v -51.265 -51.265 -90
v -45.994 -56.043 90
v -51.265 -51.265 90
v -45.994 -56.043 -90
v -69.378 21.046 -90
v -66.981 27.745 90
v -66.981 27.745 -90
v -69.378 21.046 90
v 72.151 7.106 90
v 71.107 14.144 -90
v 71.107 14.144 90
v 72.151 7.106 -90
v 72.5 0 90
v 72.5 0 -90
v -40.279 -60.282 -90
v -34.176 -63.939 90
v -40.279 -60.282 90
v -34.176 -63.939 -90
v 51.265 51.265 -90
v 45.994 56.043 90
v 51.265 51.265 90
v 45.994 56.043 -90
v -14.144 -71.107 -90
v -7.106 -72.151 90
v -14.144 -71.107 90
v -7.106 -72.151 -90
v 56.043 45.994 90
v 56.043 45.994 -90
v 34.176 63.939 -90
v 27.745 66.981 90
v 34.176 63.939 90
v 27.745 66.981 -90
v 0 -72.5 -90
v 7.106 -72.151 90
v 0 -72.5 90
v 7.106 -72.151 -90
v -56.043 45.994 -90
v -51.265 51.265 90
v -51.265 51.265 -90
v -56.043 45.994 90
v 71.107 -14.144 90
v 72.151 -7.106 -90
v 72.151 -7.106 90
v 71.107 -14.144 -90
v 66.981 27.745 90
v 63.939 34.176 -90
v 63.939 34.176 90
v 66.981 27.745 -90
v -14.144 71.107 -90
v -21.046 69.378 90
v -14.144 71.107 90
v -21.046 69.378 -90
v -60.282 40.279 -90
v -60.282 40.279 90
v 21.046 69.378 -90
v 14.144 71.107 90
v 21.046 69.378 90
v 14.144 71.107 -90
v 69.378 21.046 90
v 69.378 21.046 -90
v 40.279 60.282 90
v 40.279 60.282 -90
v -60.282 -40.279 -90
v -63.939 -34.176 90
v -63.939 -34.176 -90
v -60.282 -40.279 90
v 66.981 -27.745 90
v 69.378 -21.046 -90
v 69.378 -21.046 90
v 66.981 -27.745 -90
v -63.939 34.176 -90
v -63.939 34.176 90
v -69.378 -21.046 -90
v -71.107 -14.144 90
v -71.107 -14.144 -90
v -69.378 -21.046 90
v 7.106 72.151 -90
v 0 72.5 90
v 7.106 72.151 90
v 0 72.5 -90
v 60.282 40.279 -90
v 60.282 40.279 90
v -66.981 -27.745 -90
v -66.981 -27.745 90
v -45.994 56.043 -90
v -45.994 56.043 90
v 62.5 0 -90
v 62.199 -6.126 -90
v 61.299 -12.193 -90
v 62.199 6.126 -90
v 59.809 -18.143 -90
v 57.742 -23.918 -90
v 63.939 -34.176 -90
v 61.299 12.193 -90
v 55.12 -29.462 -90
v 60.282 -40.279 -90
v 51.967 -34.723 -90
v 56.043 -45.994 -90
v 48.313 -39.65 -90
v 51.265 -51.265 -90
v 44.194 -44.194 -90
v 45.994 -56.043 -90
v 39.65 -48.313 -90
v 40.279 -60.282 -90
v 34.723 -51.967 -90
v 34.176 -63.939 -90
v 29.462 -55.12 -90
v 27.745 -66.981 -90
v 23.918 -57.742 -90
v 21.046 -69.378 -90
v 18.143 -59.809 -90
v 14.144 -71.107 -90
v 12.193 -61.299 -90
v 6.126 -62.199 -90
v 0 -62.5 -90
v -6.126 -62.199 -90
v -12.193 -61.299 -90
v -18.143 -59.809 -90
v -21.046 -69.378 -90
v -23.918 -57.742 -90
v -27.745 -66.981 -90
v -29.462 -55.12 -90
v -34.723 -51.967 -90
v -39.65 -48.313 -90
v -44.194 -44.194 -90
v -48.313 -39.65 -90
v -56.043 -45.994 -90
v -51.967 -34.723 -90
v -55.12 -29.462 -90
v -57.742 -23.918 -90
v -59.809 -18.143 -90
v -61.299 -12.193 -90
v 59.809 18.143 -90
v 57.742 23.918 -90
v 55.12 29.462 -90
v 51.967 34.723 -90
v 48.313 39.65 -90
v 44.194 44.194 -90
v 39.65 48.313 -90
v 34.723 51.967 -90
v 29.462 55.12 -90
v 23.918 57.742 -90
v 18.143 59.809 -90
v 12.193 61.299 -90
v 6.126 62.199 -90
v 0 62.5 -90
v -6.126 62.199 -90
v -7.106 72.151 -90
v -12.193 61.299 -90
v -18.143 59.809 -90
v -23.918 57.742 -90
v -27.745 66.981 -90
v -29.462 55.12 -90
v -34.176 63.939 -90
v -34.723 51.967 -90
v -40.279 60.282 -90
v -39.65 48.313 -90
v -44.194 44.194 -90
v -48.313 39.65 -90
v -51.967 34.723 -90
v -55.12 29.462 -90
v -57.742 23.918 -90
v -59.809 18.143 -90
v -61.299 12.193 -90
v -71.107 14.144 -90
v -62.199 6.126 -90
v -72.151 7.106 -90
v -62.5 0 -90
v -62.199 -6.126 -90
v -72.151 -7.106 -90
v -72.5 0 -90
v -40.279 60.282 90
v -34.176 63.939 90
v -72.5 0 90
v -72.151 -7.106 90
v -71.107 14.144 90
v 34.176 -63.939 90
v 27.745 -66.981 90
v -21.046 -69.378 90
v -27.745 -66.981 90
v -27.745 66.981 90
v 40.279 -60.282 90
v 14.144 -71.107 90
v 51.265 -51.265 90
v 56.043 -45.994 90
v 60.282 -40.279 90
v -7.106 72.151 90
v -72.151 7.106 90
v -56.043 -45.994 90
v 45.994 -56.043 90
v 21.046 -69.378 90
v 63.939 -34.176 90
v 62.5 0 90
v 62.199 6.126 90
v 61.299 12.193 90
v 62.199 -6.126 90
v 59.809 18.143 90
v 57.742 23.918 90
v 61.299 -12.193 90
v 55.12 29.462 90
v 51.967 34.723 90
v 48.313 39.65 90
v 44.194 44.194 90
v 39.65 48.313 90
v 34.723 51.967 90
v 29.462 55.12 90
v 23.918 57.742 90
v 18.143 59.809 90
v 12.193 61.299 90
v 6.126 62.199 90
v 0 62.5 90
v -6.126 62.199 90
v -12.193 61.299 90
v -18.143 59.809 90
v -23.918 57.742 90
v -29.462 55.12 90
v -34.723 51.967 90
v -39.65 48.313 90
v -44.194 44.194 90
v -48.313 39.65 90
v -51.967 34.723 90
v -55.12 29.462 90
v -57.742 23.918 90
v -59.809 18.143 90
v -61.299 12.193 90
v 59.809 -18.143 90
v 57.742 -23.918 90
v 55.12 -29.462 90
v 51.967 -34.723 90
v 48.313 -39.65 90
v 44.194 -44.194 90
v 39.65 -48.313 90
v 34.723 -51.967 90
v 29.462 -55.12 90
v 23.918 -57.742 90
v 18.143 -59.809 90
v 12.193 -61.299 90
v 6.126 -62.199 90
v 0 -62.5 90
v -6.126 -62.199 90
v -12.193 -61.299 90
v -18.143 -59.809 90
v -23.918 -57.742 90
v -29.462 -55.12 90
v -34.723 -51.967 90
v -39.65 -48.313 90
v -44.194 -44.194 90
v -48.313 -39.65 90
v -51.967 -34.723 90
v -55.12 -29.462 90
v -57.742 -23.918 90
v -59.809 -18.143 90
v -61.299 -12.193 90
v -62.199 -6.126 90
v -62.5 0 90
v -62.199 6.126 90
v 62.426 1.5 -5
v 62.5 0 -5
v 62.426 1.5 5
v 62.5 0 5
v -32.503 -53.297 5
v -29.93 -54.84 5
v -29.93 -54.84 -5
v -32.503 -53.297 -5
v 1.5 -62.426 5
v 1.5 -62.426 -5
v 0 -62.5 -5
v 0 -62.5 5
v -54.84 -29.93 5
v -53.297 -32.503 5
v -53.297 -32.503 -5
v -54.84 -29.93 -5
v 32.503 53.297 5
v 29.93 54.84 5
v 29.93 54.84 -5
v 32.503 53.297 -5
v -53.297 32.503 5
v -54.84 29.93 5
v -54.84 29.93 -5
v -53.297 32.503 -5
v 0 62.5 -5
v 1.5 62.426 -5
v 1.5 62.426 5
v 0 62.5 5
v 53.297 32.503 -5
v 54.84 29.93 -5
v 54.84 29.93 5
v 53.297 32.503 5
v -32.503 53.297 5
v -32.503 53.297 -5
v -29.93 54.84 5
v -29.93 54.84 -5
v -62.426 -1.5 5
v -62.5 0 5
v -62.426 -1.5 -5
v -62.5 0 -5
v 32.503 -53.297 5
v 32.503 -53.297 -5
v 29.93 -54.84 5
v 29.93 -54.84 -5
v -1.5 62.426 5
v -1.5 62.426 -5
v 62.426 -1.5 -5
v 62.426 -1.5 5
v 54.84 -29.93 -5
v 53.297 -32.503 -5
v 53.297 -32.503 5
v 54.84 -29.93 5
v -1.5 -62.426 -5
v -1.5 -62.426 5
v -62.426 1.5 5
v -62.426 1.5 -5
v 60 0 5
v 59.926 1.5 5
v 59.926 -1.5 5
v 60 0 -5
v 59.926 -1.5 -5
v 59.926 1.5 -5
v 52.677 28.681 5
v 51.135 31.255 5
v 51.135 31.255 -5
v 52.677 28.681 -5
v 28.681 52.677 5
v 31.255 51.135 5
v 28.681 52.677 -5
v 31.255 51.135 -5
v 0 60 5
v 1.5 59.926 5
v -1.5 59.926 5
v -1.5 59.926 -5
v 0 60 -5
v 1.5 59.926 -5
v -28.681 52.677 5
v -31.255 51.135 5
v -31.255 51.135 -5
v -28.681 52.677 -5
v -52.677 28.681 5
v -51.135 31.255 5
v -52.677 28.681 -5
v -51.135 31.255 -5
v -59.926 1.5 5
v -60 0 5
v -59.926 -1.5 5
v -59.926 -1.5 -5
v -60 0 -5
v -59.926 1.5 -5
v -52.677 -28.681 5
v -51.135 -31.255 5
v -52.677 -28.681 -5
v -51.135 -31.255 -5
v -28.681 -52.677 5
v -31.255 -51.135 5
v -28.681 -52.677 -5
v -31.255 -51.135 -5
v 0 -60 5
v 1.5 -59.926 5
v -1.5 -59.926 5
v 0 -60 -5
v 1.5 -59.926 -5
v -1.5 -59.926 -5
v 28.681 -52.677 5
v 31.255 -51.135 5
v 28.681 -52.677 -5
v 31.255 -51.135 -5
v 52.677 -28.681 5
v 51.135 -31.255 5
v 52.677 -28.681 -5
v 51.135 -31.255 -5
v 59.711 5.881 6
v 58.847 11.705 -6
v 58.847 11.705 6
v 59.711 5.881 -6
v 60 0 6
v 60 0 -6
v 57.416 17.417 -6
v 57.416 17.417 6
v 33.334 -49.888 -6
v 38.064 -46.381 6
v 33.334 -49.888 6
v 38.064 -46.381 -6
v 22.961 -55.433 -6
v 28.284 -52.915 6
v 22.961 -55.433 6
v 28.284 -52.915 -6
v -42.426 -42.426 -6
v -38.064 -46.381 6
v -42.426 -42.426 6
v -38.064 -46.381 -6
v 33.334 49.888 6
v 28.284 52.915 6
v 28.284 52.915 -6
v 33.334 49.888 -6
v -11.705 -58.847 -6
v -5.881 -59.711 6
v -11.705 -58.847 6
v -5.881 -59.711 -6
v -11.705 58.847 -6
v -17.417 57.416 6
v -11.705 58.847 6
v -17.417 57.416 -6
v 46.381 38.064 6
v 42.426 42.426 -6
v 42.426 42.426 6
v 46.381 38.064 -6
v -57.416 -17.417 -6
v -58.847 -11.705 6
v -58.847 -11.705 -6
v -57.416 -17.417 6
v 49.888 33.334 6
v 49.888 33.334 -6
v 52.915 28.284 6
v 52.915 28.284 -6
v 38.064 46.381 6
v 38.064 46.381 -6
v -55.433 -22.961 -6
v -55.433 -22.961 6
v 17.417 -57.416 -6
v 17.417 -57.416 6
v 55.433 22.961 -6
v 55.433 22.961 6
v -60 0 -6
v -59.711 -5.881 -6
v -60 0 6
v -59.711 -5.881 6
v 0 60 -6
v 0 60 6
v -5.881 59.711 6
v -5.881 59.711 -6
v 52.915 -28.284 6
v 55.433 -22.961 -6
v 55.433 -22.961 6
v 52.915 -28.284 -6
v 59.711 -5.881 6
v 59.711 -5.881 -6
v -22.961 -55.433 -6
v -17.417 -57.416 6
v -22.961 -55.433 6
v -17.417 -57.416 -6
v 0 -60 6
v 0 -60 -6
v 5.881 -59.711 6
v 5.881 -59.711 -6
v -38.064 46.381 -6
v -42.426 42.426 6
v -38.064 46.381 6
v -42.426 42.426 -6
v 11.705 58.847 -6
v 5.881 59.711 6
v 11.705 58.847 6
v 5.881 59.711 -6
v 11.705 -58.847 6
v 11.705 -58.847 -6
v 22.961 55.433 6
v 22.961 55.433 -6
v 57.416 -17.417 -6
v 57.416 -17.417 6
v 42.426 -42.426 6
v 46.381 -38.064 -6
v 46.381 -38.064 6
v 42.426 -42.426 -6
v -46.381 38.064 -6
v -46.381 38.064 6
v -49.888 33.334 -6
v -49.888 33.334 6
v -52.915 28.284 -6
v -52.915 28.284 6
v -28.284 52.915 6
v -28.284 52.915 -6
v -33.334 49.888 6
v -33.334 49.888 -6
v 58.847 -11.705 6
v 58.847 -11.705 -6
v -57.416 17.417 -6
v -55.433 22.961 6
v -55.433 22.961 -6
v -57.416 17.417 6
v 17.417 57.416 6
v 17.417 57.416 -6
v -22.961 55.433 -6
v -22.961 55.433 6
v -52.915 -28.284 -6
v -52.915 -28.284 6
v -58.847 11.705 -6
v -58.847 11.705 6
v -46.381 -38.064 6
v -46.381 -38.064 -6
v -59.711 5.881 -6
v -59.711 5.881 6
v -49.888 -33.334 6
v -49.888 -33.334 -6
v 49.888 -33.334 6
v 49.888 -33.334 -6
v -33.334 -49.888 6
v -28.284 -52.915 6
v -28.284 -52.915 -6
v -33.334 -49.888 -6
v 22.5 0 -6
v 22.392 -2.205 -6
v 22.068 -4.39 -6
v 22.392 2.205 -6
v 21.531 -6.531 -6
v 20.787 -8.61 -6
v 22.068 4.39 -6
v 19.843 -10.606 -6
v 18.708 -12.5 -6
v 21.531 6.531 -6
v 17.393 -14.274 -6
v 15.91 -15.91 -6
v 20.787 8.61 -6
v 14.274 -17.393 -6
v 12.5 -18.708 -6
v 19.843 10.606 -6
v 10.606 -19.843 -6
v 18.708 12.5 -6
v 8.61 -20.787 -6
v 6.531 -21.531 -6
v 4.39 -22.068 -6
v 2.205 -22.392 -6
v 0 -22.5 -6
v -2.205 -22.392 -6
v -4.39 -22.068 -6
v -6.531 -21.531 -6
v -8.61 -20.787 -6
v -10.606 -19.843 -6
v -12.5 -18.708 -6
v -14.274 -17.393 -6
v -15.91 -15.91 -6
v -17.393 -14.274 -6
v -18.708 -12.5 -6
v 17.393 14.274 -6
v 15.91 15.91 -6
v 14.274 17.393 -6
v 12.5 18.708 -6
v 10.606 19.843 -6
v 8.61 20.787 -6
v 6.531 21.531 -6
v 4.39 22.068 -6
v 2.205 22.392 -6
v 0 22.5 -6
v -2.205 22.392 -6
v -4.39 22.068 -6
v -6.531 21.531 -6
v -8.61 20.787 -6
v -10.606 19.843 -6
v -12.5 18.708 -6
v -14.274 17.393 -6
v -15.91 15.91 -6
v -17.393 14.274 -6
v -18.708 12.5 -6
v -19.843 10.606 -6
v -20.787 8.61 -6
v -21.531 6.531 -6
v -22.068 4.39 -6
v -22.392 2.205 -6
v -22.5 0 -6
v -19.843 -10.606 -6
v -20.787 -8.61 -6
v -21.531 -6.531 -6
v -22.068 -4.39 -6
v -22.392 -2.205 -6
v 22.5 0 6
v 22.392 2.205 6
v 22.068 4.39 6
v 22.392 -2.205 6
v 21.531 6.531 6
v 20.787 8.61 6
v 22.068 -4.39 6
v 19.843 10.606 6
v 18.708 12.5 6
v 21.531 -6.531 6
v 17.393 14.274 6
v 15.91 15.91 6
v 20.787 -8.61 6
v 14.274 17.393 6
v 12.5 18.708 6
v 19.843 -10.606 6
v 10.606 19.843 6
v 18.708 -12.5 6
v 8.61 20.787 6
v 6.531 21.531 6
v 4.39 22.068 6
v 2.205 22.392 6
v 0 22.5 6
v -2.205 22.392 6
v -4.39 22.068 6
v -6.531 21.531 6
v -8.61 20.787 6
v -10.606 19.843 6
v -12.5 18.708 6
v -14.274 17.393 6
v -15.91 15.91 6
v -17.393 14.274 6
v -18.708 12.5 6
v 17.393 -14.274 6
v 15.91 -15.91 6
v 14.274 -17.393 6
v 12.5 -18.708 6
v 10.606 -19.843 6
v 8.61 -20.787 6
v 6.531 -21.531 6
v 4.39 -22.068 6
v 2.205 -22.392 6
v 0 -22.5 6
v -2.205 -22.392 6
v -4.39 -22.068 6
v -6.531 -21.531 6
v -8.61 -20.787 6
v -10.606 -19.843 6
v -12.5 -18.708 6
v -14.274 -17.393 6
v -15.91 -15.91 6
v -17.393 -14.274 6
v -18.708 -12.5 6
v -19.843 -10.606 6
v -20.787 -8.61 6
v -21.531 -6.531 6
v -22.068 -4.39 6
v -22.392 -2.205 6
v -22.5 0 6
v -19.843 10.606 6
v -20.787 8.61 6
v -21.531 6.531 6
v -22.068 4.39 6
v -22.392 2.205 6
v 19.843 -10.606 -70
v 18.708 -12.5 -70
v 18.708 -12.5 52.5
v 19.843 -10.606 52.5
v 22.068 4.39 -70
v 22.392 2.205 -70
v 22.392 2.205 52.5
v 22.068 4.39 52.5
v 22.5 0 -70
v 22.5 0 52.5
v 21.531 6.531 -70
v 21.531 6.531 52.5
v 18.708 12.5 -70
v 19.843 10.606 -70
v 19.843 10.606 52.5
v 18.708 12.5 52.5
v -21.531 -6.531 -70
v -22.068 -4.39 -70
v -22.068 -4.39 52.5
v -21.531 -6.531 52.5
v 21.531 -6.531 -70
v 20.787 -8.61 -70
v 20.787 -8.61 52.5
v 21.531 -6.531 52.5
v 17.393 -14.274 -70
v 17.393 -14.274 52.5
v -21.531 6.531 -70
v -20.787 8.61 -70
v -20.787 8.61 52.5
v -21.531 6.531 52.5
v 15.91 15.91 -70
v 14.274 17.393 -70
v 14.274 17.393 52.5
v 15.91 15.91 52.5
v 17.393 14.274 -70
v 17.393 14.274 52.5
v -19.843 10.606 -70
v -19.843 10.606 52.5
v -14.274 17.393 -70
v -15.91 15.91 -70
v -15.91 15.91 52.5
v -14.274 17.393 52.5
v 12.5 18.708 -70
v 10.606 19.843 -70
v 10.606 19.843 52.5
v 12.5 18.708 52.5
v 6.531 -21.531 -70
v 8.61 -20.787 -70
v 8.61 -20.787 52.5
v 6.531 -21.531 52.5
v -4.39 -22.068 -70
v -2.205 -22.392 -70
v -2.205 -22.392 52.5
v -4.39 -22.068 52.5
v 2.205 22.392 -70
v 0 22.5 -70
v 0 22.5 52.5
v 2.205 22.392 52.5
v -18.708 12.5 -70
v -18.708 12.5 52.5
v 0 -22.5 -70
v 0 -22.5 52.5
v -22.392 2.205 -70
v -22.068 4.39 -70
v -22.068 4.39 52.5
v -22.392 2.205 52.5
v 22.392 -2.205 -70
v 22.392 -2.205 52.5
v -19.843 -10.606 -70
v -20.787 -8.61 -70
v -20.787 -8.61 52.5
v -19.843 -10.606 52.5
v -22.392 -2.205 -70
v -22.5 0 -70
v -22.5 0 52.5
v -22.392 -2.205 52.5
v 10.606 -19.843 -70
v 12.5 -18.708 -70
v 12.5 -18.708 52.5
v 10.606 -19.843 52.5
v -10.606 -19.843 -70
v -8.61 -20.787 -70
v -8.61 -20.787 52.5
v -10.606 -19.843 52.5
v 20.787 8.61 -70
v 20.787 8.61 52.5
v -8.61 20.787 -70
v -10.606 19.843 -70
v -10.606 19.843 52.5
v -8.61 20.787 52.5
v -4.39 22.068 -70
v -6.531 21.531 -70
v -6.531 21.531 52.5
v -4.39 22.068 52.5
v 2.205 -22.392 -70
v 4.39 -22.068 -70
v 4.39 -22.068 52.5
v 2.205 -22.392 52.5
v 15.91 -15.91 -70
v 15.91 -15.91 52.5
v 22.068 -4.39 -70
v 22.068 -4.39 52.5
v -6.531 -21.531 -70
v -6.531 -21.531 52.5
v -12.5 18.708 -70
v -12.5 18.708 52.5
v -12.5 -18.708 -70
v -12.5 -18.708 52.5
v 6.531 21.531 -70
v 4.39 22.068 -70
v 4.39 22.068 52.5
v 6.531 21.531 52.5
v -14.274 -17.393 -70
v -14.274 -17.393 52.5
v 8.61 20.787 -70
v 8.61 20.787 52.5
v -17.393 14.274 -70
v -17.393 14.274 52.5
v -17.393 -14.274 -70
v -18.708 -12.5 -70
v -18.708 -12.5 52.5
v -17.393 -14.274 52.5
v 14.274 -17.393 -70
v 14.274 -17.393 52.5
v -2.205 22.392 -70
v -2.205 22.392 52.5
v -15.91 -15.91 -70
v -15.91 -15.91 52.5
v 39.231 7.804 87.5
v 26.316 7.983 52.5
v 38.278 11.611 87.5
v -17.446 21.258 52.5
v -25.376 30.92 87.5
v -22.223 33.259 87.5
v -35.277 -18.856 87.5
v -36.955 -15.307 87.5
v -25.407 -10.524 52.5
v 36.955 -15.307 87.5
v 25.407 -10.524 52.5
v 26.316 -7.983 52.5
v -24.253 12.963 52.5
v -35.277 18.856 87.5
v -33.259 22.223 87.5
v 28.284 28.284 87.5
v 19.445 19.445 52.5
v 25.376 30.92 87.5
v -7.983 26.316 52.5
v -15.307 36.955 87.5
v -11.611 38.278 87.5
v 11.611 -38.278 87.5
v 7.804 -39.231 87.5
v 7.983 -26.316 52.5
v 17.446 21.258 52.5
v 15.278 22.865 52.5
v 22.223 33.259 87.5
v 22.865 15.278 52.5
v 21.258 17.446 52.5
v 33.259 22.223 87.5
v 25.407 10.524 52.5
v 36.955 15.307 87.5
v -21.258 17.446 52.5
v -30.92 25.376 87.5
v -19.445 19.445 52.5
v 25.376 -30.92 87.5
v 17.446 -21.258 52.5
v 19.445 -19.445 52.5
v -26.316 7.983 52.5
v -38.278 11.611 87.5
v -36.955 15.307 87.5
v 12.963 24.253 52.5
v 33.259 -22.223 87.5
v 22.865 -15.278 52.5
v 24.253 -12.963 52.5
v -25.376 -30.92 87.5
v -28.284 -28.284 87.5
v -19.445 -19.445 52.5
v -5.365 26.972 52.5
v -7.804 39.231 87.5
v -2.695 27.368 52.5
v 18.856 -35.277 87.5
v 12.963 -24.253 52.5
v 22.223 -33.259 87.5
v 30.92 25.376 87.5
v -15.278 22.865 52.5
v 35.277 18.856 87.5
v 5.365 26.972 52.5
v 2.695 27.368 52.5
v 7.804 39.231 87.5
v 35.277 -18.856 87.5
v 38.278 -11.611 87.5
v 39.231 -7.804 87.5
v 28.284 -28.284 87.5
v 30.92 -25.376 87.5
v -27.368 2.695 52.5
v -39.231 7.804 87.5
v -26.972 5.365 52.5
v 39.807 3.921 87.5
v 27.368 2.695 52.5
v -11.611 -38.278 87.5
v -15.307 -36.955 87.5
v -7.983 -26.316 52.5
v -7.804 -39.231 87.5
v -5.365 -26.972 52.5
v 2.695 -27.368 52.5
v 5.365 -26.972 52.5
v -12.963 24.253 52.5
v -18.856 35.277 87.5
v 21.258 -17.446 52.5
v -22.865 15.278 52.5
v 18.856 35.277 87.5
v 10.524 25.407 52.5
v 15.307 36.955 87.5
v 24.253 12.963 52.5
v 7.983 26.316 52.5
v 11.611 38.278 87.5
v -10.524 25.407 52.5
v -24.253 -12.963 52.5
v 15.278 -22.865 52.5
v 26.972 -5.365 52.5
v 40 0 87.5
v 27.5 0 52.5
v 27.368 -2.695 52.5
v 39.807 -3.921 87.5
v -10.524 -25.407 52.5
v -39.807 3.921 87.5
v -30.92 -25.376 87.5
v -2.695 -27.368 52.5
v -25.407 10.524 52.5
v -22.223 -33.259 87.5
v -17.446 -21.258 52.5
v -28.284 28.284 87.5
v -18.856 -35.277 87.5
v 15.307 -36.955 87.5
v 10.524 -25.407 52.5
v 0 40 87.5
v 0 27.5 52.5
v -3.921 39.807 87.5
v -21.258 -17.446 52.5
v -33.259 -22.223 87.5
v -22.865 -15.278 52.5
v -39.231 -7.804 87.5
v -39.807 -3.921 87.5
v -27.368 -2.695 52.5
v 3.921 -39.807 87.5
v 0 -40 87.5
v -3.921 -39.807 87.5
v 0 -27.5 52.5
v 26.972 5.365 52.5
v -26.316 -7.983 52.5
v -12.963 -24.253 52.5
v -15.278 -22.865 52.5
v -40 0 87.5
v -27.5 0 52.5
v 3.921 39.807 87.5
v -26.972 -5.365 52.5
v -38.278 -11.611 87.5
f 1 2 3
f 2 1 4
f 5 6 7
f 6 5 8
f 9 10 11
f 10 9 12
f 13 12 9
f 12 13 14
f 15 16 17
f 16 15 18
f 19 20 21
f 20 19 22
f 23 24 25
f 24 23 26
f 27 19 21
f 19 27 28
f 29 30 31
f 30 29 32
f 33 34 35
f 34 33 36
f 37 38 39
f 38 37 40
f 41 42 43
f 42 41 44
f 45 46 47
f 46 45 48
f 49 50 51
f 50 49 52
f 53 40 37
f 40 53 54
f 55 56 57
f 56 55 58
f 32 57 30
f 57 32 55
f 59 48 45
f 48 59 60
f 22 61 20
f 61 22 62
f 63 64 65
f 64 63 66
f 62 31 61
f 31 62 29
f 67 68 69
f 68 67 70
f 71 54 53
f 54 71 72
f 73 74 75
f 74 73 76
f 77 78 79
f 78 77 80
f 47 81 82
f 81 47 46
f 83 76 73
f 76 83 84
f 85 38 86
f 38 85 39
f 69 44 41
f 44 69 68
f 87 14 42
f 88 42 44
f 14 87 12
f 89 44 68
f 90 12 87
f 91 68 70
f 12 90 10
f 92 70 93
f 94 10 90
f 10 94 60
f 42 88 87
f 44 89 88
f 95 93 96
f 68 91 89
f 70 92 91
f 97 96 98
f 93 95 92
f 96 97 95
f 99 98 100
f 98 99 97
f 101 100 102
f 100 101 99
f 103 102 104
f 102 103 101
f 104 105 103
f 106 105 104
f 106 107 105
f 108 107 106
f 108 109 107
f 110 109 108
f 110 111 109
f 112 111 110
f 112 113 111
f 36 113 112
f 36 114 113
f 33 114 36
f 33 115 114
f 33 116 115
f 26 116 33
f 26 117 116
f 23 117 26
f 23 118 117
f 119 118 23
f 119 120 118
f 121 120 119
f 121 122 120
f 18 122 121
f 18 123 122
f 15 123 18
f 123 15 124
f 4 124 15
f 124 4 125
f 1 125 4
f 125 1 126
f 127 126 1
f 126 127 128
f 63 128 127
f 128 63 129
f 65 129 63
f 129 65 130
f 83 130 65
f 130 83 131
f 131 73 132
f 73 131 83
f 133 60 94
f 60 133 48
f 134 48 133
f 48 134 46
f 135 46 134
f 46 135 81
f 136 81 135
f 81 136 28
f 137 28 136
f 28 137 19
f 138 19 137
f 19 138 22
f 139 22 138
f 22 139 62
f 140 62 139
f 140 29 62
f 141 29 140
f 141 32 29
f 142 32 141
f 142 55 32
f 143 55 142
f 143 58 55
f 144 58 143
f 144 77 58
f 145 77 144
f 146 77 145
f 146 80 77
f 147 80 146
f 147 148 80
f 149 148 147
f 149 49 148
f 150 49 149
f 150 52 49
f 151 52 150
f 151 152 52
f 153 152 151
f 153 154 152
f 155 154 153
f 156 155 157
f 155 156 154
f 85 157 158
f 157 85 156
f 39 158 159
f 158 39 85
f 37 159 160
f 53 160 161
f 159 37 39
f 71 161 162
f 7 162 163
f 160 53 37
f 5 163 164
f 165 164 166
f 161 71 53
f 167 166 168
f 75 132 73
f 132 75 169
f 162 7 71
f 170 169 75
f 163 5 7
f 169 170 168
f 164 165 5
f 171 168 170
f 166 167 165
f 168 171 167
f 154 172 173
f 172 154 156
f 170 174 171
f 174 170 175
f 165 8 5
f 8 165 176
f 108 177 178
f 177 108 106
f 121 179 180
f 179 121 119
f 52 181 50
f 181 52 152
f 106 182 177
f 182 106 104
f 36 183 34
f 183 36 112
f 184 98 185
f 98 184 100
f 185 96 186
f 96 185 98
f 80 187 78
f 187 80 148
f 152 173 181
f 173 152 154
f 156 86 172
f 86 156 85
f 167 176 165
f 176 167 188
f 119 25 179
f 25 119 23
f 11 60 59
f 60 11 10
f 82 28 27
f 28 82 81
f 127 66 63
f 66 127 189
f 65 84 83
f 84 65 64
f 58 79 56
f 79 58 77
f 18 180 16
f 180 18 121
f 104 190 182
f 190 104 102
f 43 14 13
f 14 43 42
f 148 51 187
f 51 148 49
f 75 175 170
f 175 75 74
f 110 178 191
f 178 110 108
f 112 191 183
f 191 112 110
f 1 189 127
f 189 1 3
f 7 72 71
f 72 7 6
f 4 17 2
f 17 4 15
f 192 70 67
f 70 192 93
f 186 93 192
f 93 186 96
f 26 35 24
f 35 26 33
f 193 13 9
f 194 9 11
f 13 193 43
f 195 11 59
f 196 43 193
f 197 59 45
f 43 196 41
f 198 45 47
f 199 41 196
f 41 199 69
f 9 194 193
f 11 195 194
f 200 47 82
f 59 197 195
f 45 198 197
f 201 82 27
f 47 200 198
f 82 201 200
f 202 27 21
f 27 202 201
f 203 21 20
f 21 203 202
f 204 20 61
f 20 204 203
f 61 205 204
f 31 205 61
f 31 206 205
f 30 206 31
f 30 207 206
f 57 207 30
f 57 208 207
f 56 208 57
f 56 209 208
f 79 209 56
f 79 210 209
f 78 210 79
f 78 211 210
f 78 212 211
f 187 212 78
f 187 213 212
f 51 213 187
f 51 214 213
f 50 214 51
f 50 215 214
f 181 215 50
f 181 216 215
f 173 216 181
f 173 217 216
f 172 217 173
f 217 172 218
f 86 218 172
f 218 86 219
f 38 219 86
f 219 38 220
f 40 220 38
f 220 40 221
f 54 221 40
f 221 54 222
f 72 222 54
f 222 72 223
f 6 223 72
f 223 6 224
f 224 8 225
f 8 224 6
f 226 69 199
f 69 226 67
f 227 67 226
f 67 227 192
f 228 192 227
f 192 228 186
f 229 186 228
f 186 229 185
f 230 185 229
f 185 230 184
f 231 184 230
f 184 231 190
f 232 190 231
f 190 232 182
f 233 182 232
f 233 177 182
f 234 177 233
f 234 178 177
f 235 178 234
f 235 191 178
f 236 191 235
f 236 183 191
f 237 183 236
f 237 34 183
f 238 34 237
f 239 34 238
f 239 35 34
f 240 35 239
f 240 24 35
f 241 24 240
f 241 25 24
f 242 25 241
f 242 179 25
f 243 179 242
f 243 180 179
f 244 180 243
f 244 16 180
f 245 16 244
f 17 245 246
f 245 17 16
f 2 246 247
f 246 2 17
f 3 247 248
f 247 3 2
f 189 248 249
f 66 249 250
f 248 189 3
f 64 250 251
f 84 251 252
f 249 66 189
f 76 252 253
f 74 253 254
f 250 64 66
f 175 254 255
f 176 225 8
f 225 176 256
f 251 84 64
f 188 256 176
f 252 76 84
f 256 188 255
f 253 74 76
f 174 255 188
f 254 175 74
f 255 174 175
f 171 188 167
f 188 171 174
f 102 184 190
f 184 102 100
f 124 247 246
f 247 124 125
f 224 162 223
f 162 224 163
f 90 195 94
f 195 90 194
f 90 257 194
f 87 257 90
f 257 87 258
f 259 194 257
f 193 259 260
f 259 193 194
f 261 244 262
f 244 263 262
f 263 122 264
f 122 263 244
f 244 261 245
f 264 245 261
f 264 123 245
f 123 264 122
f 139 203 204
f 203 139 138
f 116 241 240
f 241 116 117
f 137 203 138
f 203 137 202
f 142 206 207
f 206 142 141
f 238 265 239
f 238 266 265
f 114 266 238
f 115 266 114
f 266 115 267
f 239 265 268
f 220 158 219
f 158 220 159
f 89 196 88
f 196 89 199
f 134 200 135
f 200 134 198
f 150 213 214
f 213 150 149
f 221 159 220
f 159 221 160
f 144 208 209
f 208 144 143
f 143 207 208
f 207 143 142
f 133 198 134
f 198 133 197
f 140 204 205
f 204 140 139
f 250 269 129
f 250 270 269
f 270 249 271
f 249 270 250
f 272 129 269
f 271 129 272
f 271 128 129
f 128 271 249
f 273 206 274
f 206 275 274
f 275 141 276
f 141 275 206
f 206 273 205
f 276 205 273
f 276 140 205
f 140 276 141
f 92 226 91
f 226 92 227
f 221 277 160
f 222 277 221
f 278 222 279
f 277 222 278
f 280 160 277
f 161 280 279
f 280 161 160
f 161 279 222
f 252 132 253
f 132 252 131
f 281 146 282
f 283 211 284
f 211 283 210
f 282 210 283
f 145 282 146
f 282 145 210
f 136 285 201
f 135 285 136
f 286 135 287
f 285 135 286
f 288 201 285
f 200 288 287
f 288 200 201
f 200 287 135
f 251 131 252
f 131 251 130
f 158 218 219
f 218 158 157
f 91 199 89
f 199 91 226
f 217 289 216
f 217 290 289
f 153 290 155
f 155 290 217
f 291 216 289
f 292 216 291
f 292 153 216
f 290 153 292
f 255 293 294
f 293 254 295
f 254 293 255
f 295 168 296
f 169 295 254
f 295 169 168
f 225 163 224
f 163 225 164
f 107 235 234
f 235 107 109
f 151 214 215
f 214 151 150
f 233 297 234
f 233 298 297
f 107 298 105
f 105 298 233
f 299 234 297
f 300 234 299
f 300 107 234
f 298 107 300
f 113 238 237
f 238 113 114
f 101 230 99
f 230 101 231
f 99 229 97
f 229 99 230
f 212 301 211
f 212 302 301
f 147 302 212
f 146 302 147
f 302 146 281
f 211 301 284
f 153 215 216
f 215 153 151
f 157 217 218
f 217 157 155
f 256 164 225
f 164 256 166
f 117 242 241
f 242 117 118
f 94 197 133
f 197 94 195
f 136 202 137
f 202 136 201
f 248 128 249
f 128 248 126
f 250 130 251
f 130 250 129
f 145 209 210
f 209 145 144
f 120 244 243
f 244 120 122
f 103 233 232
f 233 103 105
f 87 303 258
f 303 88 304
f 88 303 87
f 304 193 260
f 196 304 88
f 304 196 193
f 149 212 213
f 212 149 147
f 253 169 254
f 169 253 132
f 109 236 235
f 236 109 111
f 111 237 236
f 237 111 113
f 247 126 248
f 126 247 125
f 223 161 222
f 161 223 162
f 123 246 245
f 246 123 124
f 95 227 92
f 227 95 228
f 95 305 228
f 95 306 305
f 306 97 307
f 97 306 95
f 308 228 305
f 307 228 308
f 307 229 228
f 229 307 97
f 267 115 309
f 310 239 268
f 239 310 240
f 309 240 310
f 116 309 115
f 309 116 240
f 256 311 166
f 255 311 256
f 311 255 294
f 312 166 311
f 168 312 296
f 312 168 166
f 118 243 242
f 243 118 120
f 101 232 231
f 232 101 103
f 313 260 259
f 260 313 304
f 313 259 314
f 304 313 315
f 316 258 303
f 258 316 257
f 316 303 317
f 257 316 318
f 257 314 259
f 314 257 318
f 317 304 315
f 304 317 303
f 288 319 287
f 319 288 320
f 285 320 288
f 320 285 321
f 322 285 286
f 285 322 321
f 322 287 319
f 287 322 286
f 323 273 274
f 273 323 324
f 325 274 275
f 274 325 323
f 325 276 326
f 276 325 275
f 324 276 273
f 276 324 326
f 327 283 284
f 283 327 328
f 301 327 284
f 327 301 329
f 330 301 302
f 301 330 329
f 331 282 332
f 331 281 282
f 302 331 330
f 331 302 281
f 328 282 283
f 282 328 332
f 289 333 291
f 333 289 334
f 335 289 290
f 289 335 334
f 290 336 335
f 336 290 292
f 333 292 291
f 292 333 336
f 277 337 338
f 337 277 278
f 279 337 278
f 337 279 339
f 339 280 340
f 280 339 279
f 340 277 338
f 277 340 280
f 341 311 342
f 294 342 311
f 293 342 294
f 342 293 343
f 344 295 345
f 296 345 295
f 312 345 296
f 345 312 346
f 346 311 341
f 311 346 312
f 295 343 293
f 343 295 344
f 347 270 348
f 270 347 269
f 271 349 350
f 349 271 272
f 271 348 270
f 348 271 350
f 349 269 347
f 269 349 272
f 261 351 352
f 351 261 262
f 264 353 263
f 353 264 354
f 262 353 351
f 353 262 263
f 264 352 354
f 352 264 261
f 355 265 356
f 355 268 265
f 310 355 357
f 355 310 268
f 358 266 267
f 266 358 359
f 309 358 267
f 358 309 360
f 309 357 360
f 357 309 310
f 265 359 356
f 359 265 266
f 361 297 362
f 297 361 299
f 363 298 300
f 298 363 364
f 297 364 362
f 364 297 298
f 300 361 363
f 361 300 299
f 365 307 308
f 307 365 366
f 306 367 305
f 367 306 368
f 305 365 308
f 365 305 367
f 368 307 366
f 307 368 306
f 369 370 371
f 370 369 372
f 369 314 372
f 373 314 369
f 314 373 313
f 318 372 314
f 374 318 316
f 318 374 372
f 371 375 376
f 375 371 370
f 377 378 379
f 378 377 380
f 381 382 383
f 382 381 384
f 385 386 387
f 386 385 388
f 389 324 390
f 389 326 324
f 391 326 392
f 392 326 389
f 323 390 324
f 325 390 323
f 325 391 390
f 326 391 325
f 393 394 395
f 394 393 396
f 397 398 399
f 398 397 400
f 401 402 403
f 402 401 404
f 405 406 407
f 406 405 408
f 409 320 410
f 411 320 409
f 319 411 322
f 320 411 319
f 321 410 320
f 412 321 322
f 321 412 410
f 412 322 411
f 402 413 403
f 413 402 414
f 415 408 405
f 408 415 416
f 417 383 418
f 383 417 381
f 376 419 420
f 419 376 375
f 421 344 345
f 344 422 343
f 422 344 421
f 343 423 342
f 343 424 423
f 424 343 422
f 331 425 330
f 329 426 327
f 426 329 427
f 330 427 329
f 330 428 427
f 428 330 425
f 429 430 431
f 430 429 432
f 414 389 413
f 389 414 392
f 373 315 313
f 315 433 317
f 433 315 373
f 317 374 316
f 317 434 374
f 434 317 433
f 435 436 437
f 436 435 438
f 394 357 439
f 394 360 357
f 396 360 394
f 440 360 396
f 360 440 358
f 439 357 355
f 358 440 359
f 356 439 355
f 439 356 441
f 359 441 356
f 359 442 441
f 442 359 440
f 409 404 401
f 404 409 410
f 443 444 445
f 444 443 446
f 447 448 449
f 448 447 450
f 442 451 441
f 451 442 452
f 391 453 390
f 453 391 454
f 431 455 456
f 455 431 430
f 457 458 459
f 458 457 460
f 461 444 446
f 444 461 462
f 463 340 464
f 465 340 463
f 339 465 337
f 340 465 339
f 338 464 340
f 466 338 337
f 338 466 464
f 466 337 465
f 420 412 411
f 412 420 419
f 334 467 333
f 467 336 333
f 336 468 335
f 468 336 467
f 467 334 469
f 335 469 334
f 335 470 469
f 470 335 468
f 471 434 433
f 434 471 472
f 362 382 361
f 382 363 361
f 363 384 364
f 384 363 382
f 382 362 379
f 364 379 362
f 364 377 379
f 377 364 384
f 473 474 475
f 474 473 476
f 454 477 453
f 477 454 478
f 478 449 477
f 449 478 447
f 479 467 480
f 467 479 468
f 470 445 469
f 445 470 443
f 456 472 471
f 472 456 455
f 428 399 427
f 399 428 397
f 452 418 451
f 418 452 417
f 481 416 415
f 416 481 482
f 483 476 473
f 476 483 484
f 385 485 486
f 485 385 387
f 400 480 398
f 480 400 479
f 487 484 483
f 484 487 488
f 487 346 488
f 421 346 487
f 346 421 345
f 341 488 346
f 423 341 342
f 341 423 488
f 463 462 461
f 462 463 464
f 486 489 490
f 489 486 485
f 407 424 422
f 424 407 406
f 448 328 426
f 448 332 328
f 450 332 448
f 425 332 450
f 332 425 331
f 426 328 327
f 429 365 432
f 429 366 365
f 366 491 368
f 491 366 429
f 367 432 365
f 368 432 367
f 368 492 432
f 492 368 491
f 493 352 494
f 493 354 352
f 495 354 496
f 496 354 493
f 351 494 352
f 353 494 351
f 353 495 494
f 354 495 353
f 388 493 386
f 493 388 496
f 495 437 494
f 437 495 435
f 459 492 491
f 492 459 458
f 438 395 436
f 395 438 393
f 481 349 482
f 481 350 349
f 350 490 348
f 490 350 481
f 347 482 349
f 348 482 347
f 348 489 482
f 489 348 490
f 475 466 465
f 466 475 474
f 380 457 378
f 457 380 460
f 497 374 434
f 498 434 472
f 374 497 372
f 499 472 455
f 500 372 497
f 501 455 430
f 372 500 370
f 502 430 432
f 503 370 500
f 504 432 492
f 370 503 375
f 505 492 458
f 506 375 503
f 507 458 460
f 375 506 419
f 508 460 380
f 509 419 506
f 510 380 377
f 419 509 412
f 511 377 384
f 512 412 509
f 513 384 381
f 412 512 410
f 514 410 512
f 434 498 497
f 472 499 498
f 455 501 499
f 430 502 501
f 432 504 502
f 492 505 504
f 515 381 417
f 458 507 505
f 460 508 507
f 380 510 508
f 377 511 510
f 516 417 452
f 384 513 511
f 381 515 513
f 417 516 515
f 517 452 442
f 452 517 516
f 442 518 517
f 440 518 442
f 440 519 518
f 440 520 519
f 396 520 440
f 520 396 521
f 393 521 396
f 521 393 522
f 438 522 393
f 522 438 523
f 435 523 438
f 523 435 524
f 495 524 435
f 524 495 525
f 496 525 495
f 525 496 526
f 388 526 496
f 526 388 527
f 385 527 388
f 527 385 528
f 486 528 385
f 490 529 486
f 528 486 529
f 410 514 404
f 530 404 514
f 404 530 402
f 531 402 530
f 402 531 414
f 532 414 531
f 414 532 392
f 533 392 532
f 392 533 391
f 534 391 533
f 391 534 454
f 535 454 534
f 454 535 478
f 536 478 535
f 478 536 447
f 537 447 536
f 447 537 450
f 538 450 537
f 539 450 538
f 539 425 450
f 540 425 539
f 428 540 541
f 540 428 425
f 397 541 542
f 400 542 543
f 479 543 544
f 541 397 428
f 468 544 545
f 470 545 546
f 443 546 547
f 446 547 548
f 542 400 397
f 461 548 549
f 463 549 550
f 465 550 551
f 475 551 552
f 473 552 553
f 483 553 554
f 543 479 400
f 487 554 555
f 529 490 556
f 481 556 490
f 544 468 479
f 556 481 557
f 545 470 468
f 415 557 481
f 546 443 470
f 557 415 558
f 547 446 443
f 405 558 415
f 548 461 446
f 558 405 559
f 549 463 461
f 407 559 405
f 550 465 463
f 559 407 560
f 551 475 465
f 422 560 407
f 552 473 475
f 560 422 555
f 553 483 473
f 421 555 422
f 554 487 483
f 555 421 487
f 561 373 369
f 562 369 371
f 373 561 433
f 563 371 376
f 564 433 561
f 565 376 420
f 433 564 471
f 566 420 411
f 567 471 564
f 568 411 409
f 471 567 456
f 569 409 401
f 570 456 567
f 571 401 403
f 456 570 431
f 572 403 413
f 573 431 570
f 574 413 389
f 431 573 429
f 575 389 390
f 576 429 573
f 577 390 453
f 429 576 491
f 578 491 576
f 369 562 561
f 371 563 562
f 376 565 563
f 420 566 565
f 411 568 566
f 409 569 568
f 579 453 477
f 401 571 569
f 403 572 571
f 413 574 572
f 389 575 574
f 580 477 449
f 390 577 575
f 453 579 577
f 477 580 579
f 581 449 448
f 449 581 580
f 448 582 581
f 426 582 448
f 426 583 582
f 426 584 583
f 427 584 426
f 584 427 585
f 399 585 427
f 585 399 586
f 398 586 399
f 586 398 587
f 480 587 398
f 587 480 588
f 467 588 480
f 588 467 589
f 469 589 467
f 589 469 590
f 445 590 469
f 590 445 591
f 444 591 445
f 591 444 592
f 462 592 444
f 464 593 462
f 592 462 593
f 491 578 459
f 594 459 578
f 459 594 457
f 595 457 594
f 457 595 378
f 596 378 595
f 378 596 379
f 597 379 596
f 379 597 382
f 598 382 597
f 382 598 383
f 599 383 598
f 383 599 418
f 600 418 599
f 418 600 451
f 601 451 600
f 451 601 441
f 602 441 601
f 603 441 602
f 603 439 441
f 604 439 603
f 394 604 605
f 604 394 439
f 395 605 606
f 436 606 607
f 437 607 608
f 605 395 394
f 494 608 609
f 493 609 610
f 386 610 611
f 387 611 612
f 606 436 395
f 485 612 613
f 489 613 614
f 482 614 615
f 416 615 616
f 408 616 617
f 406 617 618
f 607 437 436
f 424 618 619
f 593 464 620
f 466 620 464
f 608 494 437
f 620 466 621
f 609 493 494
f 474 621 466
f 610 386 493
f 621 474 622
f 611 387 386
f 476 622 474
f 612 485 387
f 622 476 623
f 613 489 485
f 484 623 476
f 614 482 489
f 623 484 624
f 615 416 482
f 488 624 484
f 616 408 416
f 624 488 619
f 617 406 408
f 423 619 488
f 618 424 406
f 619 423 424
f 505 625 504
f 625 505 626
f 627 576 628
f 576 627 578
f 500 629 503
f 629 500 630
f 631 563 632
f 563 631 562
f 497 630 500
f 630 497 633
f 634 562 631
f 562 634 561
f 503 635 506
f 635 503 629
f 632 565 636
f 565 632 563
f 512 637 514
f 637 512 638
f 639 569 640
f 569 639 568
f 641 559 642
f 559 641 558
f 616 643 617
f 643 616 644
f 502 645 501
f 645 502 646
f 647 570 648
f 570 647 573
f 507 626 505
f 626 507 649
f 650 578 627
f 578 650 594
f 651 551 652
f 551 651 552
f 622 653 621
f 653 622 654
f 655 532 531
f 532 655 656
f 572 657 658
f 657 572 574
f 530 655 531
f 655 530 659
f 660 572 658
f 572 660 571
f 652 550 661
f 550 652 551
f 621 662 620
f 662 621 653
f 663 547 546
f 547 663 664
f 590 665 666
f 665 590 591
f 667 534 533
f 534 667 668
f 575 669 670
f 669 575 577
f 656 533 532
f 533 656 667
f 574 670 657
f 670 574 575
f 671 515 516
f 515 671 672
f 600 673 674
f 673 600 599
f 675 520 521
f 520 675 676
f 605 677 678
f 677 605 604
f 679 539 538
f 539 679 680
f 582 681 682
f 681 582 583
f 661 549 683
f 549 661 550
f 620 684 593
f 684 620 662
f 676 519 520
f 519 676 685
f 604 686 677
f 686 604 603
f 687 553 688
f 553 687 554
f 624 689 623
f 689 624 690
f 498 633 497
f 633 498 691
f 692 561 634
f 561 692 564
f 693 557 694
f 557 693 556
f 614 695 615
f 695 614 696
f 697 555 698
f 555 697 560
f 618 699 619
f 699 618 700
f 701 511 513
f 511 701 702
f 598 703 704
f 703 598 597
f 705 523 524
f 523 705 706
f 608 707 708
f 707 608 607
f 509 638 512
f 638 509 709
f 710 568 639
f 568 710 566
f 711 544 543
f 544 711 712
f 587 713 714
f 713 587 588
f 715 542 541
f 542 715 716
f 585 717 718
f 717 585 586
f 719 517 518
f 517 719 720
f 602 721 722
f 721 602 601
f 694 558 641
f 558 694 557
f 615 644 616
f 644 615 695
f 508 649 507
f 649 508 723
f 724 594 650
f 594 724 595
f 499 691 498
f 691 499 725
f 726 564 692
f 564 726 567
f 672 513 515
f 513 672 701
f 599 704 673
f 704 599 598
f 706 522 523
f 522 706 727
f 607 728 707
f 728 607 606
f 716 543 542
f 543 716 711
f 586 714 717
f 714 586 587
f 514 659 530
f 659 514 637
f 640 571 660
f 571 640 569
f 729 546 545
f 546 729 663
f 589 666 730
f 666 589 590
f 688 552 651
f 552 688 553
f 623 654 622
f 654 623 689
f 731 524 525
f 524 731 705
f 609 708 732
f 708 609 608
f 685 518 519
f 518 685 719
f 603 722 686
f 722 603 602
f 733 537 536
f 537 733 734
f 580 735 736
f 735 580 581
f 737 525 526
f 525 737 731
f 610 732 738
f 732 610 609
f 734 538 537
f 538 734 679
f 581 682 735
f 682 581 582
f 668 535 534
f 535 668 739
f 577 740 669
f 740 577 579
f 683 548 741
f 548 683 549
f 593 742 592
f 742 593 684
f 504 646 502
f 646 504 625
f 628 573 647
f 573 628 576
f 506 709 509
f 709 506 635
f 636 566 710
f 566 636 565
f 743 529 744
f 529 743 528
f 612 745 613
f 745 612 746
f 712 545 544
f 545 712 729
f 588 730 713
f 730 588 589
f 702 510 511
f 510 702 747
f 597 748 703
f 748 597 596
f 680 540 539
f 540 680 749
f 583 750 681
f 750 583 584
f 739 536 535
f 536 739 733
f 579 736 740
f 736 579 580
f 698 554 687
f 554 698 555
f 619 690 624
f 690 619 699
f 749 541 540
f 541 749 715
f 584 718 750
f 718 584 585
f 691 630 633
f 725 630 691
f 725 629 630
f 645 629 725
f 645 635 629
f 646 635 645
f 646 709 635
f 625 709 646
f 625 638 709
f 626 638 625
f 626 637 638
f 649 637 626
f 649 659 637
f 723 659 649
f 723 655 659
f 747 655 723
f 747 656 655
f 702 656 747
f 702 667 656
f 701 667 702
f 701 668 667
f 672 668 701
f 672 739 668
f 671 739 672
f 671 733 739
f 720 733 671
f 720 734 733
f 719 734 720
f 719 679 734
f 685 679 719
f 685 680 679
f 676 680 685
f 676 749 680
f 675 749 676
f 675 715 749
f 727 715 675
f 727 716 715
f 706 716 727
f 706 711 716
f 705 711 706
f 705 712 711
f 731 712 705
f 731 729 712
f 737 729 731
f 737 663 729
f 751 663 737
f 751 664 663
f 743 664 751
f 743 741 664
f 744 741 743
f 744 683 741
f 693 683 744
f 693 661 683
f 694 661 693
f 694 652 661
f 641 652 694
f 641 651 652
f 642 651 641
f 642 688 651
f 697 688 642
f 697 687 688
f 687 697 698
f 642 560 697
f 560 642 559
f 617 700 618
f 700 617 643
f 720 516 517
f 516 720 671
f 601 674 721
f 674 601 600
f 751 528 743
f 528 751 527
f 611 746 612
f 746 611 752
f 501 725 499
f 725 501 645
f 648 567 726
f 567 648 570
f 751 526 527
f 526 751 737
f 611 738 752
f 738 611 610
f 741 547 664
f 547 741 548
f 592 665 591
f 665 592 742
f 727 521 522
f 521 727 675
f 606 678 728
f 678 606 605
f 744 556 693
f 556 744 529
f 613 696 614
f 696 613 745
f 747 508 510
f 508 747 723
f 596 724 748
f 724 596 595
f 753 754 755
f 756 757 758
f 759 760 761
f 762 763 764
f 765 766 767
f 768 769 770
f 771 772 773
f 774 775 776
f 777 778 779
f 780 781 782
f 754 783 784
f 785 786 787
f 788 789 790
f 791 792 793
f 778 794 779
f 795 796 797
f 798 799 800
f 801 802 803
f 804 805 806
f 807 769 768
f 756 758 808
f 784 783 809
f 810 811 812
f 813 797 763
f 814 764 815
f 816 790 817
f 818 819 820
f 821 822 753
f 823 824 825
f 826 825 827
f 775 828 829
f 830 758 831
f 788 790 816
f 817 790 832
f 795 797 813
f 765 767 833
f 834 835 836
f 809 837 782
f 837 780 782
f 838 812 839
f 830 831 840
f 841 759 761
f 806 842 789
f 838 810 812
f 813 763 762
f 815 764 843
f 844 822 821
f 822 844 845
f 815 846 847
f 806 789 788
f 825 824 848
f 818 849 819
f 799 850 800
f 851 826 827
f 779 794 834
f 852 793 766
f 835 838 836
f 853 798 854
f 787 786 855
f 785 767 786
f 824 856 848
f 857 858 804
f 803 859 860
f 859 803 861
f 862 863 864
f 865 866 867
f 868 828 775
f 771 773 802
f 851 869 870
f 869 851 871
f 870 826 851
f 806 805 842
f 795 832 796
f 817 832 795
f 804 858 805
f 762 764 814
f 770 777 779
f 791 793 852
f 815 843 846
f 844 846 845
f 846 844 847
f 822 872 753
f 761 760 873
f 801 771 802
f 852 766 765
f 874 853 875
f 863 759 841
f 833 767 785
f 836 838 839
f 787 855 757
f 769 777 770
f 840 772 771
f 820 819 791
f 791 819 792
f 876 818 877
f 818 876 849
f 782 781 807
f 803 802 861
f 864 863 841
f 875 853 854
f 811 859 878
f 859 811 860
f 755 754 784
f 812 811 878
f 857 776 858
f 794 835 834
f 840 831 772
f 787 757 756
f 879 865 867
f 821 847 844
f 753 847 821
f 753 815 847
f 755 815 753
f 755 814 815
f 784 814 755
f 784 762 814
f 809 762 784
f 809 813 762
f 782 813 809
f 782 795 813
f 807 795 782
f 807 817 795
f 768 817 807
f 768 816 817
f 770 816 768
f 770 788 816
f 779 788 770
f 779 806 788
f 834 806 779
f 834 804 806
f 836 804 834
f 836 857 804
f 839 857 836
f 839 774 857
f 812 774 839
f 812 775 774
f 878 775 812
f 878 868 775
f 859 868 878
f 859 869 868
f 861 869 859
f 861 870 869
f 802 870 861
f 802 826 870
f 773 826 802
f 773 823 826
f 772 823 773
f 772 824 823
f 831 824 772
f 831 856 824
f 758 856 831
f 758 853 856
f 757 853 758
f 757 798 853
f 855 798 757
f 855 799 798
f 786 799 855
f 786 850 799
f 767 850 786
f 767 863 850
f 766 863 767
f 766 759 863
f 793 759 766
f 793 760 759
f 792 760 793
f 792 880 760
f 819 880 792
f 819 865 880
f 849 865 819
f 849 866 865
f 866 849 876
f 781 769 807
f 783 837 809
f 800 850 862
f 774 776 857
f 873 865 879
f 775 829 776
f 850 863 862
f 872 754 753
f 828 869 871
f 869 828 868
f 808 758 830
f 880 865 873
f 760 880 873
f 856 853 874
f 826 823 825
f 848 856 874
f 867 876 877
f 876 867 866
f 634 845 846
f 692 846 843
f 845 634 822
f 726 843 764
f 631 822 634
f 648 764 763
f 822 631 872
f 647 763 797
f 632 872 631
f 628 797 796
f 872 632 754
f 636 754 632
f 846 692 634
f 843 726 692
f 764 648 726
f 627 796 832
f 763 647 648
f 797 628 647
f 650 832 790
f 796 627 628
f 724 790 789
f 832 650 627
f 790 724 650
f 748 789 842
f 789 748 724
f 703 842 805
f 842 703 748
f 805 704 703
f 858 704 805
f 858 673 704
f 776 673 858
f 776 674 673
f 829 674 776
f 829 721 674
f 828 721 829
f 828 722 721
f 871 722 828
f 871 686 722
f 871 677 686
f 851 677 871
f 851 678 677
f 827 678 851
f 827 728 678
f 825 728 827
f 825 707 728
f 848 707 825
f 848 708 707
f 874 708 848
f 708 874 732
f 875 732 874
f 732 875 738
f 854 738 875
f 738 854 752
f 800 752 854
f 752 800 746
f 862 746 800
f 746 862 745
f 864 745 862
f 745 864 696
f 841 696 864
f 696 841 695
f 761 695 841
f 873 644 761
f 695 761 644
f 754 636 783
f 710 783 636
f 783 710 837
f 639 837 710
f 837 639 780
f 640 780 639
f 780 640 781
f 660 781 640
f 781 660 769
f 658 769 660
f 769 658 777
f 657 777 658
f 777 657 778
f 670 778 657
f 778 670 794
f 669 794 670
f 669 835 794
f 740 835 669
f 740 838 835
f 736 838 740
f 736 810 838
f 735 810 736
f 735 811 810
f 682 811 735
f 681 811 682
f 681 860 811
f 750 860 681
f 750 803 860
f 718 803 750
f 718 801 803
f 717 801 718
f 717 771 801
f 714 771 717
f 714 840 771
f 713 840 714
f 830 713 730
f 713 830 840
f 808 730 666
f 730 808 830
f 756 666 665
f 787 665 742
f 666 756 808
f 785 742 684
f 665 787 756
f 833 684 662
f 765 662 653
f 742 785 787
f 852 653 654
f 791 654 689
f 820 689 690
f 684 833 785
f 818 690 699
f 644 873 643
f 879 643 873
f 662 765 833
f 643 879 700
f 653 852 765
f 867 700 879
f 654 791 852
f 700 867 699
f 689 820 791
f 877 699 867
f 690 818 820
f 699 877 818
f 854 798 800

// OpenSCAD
// An-Ra engineering template — stylized turbofan cutaway (NOT OEM-accurate).
// Use as a diagram scaffold; replace dimensions from your source of truth.

$fn = 64;
fan_d = 120;
core_d = 45;
engine_l = 180;

module fan_stage() {
    color("Silver") cylinder(h=12, d=fan_d, center=true);
    for (a = [0:30:330])
        rotate([0, 0, a]) translate([fan_d/2 - 4, 0, 0])
            color("Gray") cube([18, 3, 10], center=true);
}

module core_duct() {
    color("DarkGray") cylinder(h=engine_l - 40, d=core_d, center=true);
}

module exhaust_nozzle() {
    color("Orange") translate([0, 0, engine_l/2 - 20])
        cylinder(h=35, d1=core_d + 10, d2=core_d + 35, center=true);
}

module nacelle() {
    color("LightGray", 0.35) difference() {
        cylinder(h=engine_l, d=fan_d + 25, center=true);
        cylinder(h=engine_l + 2, d=fan_d + 5, center=true);
    }
}

translate([0, 0, 0]) {
    nacelle();
    fan_stage();
    core_duct();
    exhaust_nozzle();
}
